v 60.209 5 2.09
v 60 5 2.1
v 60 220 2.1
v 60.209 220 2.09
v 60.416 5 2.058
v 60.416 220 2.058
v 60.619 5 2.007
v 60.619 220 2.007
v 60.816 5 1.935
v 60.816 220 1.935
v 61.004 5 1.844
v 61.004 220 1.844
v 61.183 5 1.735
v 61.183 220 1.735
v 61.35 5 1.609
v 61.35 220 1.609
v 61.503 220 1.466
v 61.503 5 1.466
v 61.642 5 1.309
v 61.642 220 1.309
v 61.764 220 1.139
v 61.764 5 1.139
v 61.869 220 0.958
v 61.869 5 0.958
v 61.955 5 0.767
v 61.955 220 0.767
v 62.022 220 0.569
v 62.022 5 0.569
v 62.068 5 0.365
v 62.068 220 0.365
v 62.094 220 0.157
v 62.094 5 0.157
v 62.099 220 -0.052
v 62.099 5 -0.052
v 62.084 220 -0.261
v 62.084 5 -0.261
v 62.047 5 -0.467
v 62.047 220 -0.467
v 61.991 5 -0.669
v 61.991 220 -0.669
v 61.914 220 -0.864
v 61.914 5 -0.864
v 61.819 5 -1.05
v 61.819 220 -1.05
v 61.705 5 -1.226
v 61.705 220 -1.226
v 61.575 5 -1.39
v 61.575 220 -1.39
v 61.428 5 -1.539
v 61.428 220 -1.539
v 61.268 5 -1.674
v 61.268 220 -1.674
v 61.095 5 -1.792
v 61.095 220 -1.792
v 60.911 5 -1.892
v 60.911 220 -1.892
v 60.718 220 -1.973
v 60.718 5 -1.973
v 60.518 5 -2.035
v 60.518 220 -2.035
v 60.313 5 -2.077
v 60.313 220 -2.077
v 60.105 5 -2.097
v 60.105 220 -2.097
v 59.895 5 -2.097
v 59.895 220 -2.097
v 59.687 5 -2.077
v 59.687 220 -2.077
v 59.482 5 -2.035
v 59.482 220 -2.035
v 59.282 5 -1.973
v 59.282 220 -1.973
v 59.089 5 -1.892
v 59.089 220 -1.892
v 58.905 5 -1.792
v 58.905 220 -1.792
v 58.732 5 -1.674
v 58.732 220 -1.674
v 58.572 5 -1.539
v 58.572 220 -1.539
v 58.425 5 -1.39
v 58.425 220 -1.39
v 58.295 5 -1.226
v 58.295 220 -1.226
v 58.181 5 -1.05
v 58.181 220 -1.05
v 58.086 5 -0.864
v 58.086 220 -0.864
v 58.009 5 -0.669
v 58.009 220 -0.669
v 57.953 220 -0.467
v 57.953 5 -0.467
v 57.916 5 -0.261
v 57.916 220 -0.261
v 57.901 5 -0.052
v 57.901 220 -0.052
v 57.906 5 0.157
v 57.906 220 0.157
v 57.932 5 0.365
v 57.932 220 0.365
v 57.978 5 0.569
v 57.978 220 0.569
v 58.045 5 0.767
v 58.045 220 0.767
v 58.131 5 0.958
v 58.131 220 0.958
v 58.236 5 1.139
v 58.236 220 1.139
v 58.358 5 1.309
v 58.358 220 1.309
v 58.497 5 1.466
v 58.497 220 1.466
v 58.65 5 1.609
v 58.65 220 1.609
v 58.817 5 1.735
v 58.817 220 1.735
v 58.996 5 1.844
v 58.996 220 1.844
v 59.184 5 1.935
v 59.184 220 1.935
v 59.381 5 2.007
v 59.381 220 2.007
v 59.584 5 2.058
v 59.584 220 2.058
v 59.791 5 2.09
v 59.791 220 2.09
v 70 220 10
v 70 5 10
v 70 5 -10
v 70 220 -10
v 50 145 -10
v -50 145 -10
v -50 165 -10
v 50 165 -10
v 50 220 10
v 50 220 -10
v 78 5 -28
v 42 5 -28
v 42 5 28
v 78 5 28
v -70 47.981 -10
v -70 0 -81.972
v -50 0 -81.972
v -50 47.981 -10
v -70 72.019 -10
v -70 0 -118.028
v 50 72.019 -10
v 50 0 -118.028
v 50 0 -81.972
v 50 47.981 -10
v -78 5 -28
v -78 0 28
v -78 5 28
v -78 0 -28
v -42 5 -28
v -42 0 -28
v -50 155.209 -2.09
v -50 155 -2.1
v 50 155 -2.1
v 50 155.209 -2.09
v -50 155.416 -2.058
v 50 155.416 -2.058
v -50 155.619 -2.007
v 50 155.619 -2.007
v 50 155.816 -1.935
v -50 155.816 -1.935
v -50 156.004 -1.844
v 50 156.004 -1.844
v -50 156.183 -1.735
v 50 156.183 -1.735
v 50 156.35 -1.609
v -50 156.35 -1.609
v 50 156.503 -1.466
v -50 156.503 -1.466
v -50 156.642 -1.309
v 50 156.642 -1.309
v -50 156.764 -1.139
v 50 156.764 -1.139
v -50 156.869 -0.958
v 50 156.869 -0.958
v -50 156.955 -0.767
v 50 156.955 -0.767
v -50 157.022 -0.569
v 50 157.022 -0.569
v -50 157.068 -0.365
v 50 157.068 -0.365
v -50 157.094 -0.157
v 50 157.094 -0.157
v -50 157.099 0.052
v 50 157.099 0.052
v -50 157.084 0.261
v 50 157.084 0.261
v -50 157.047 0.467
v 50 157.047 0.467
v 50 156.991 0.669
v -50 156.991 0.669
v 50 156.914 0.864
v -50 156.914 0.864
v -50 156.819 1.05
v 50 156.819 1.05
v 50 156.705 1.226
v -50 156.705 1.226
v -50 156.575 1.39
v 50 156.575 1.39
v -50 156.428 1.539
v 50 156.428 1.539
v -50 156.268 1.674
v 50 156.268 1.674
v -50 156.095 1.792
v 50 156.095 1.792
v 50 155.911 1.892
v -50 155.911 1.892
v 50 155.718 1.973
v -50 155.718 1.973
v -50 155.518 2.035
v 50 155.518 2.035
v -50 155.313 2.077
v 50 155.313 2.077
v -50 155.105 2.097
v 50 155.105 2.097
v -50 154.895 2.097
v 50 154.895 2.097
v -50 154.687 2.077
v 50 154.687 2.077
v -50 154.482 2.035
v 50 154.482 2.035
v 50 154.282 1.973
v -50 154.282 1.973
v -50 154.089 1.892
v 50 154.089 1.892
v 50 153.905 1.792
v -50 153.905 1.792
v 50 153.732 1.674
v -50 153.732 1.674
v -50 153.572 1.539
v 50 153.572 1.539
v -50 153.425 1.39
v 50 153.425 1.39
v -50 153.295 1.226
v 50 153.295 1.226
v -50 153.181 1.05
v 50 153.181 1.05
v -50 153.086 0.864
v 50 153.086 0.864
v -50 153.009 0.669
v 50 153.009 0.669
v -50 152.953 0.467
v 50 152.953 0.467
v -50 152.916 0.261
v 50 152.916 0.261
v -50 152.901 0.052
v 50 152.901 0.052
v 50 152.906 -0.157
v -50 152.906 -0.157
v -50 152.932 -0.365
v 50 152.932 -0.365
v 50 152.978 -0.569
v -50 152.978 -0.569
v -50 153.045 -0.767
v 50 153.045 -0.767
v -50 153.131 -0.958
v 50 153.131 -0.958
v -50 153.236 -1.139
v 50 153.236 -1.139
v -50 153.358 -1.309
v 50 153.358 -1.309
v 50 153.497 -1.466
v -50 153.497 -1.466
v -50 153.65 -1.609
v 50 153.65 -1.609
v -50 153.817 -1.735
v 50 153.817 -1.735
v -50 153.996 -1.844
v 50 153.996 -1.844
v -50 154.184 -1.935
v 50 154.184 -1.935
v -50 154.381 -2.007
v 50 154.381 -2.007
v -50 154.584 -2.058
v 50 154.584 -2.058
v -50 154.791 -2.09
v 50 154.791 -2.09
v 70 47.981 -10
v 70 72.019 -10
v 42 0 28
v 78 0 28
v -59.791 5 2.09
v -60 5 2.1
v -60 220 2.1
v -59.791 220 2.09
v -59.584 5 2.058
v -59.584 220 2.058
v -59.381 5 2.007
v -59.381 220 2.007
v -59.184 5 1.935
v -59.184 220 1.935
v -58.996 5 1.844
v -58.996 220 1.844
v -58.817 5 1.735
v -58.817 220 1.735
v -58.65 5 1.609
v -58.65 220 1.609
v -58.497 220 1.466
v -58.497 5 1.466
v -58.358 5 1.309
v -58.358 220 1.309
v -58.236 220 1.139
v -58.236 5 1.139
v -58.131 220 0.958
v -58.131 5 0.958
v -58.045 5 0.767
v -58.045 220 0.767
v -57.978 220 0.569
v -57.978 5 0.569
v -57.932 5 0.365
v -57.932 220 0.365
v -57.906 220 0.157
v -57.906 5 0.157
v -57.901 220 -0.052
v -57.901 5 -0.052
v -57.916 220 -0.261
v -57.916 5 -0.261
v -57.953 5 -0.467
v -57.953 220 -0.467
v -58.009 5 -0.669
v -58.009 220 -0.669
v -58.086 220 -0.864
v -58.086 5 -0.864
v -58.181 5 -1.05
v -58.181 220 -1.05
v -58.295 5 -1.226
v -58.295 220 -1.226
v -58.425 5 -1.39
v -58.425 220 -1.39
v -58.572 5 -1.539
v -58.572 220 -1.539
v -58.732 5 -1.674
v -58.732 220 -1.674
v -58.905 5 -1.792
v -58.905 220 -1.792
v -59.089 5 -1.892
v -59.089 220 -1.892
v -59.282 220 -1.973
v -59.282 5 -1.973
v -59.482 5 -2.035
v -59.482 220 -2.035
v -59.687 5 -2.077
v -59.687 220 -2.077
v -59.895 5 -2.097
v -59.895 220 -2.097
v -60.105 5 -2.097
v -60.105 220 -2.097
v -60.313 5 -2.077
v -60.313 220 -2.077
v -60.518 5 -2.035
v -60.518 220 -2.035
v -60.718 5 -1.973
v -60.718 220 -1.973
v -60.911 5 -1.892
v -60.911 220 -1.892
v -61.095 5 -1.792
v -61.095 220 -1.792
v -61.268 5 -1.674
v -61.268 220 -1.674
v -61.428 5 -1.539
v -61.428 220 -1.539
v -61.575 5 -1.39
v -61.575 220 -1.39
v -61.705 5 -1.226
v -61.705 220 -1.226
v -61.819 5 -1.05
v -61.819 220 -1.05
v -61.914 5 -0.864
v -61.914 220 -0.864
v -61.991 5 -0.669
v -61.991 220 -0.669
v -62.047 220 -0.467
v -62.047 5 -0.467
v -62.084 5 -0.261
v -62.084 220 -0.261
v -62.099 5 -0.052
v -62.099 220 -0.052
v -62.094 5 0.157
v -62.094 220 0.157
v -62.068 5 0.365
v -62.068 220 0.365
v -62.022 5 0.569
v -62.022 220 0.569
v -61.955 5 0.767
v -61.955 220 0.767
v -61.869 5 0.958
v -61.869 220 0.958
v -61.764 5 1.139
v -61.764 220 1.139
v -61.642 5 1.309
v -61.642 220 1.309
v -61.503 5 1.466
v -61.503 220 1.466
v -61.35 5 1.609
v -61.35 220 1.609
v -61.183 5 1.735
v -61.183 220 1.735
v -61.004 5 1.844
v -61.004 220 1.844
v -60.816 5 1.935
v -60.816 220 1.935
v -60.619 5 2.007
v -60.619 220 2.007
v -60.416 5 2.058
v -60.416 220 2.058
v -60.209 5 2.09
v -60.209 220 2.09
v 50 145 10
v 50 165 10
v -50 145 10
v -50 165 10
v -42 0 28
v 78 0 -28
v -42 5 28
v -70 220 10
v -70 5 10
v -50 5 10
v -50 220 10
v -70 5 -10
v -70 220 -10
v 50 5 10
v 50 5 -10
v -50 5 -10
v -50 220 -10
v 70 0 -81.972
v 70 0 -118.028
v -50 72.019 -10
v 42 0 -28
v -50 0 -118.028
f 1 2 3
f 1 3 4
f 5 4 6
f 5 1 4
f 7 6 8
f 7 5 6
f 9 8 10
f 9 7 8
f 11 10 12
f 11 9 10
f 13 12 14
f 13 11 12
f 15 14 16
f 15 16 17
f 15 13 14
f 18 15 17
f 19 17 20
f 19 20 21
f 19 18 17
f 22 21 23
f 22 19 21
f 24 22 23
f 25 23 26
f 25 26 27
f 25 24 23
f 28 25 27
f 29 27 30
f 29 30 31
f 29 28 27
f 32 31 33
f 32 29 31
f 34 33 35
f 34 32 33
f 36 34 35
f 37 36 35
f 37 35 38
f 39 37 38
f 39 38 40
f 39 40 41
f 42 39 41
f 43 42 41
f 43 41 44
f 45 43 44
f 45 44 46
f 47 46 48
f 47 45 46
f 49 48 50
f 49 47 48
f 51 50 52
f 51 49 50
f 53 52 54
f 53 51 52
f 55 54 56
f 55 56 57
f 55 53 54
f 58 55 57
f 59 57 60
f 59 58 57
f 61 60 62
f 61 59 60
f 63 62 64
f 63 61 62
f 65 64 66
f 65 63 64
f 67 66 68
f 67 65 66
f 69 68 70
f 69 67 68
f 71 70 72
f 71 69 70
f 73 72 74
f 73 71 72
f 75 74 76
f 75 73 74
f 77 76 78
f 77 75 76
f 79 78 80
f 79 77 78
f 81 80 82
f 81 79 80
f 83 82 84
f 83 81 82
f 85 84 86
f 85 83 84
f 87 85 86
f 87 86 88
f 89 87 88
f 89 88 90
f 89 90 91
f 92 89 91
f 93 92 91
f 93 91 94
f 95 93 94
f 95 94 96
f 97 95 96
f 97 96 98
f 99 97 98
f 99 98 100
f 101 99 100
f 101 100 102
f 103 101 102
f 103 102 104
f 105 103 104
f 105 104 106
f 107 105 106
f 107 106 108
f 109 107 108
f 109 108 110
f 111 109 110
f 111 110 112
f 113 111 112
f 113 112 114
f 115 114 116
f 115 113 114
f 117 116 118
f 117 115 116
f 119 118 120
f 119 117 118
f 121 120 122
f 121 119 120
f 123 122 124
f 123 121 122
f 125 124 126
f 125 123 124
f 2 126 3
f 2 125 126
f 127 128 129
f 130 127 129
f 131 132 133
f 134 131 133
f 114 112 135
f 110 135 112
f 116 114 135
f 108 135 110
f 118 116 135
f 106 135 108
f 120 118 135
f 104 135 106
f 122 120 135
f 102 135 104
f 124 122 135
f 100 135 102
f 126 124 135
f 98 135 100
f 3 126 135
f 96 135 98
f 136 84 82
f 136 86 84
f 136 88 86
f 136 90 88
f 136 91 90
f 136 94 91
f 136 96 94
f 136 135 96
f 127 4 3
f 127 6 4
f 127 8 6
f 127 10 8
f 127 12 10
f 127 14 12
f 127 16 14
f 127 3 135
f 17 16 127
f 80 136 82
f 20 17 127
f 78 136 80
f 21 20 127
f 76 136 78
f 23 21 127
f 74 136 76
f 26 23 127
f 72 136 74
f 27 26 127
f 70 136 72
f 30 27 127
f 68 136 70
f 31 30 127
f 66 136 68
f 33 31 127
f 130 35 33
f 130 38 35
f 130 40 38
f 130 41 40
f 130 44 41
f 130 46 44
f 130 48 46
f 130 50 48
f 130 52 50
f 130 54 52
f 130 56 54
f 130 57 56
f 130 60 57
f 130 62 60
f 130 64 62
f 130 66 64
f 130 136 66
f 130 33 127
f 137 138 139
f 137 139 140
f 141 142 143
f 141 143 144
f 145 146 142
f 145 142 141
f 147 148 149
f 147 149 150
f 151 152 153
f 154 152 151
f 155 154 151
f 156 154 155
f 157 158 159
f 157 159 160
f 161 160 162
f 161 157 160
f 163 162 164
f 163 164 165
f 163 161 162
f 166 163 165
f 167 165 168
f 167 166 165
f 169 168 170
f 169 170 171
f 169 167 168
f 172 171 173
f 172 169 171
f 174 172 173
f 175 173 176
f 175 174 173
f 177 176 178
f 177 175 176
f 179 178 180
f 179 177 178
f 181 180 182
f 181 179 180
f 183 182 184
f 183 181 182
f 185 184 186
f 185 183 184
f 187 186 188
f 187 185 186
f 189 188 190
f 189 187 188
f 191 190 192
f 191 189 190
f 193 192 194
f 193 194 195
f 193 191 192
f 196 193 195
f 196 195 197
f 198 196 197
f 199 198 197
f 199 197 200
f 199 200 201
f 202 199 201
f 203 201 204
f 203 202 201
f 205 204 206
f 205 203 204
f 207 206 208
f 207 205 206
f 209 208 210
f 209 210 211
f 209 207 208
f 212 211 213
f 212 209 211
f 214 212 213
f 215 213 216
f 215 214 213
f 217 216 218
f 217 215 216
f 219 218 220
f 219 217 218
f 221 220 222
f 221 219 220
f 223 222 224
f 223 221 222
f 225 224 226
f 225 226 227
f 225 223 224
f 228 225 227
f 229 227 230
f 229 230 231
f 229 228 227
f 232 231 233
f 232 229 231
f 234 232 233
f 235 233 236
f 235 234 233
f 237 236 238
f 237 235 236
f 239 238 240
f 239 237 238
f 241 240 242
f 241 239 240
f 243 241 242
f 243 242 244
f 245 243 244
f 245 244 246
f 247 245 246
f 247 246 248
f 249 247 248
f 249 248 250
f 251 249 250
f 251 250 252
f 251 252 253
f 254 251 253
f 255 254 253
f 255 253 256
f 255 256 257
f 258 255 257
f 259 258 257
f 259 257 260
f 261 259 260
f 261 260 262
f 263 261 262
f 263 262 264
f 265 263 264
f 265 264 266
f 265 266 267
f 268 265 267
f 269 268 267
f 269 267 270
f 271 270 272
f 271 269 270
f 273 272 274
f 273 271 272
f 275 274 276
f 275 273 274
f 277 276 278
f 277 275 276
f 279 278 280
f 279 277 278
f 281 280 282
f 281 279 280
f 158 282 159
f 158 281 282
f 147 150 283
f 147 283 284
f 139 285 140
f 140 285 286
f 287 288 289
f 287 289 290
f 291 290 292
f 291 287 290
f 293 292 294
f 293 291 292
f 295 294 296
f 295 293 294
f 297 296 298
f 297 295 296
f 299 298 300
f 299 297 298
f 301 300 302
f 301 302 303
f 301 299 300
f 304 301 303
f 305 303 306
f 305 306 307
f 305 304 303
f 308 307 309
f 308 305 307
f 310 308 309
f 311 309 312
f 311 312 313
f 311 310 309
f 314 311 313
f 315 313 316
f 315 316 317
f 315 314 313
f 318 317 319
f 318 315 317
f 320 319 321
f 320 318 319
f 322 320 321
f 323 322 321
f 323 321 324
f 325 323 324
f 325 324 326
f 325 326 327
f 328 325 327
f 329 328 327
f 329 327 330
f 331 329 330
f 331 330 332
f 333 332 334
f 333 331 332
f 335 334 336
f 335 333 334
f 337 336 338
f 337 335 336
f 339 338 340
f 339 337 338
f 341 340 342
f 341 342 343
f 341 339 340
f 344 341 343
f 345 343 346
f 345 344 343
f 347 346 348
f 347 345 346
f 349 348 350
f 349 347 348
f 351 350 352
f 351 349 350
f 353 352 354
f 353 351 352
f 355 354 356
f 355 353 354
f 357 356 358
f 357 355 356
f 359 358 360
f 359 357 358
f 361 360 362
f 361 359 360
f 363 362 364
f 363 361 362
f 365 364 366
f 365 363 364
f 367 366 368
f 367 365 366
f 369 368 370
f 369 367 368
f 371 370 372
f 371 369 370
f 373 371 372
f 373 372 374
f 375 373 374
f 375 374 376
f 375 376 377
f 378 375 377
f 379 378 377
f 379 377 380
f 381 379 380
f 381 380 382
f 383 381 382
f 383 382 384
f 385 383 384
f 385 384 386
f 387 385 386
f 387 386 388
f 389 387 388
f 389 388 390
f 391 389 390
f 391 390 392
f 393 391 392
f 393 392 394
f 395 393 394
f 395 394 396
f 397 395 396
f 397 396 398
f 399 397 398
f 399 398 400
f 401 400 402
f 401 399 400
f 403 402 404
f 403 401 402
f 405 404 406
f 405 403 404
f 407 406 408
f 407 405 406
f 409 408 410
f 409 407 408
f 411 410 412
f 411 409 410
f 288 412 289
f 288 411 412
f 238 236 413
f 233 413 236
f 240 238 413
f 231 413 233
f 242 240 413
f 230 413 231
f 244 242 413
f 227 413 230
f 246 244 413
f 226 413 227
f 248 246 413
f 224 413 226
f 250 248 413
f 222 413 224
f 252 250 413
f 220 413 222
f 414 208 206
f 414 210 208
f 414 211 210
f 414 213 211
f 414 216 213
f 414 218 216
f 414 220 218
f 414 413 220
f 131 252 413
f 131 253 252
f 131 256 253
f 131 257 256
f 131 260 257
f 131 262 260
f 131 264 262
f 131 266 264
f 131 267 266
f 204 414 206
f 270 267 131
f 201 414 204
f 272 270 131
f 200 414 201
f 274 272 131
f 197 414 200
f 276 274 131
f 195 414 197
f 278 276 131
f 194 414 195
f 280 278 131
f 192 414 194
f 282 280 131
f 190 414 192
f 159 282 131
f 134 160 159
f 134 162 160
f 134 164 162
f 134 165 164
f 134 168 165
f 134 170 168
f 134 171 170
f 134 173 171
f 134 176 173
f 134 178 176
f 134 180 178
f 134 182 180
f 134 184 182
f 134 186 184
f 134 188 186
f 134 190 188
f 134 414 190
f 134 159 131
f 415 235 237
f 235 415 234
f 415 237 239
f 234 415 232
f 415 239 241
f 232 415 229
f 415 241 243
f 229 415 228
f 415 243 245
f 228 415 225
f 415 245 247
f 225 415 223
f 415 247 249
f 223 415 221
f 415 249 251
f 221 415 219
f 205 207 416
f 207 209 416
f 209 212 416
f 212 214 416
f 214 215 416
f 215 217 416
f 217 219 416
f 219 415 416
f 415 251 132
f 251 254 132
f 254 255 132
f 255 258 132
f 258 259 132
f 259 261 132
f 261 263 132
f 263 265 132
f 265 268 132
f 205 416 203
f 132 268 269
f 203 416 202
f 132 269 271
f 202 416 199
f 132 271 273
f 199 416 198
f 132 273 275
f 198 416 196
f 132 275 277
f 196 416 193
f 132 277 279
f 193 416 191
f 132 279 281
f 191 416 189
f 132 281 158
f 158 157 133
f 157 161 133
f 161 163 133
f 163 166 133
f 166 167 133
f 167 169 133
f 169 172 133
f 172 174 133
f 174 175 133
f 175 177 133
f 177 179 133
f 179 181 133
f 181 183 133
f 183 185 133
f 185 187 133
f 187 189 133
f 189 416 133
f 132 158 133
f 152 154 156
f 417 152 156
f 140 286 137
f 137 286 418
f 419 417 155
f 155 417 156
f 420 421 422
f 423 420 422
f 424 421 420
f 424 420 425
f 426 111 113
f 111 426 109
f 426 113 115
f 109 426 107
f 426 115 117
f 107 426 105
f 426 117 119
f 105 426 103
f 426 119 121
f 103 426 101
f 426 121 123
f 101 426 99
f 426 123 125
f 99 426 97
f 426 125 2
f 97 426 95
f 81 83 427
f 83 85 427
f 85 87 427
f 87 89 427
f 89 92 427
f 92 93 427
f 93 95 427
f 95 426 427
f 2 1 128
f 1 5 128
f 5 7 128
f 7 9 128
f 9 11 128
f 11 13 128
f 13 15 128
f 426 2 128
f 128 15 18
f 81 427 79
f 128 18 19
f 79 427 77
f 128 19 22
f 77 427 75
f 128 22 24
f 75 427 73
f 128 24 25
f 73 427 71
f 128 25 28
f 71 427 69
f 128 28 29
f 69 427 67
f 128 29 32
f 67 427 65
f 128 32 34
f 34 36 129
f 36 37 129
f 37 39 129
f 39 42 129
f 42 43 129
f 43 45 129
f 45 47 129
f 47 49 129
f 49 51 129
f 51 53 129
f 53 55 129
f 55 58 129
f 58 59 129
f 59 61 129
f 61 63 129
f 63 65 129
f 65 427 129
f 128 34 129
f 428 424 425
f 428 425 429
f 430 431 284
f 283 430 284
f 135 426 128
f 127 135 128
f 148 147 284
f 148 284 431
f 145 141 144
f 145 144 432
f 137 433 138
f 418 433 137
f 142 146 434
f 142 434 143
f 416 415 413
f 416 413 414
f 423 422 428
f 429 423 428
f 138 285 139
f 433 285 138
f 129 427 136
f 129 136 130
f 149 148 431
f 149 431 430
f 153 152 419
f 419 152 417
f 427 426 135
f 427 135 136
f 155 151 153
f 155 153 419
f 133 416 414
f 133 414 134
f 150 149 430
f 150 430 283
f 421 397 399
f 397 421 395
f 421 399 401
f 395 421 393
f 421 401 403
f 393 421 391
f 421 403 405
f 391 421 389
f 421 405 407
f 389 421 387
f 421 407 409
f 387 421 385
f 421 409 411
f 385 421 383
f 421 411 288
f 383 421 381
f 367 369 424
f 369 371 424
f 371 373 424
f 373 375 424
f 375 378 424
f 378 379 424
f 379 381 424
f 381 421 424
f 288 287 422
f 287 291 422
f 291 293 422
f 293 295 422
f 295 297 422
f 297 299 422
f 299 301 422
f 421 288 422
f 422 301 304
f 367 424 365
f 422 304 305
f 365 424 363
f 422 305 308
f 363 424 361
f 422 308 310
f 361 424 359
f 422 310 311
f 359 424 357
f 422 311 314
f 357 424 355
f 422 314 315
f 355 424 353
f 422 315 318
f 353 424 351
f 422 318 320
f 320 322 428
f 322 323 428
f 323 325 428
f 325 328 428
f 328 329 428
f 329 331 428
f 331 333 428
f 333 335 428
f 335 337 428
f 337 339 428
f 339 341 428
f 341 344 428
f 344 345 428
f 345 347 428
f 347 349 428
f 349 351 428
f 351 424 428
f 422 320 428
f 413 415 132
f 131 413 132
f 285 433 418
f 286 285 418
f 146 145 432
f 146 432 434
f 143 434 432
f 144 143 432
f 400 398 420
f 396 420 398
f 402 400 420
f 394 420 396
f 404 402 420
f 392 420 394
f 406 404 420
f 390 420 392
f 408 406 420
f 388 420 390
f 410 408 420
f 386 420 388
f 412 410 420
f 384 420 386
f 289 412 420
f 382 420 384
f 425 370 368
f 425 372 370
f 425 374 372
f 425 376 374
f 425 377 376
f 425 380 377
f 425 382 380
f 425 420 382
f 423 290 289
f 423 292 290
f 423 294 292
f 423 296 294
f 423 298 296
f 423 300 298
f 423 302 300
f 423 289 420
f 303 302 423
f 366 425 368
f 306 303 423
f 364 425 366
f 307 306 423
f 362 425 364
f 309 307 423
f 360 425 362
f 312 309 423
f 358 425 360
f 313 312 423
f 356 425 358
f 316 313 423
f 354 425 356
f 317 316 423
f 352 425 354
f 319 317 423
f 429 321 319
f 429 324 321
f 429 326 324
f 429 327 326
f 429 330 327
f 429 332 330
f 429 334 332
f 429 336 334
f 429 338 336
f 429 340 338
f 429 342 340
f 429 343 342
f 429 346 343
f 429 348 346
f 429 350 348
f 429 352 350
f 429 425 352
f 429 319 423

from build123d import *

# Parameters (mm, degrees)
SK_FOOTPLATES_W       = 36
SK_FOOTPLATES_H       = 56
EX_FOOTPLATES_DEPTH   = 5
EX_FOOTPLATES_2_DEPTH = 5
SK_POSTS_W            = 20
SK_POSTS_H            = 20
SK_POSTS_R            = 2.1
EX_POSTS_DEPTH        = 215
EX_POSTS_2_DEPTH      = 215
SK_BRACE_W            = 20
SK_BRACE_H            = 20
SK_BRACE_R            = 2.1
EX_BRACE_DEPTH        = 100
EX_STRUTL_DEPTH       = 20
EX_STRUTR_DEPTH       = 20


with BuildPart() as part:
    # SK_FootPlates → EX_FootPlates (new body)
    with BuildSketch(Plane(origin=(0, 0, 0), x_dir=(1, 0, 0), z_dir=(0, 1, 0))):
        with Locations((60, 0)):
            Rectangle(SK_FOOTPLATES_W, SK_FOOTPLATES_H)
    extrude(amount=EX_FOOTPLATES_DEPTH)


with BuildPart() as body_2:
    # SK_FootPlates → EX_FootPlates 2 (new body)
    with BuildSketch(Plane(origin=(0, 0, 0), x_dir=(1, 0, 0), z_dir=(0, 1, 0))):
        with Locations((-60, 0)):
            Rectangle(SK_FOOTPLATES_W, SK_FOOTPLATES_H)
    extrude(amount=EX_FOOTPLATES_2_DEPTH)


with BuildPart() as body_3:
    # SK_Posts → EX_Posts (new body)
    with BuildSketch(Plane(origin=(0, 5, 0), x_dir=(1, 0, 0), z_dir=(0, 1, 0))):
        with Locations((60, 0)):
            Rectangle(SK_POSTS_W, SK_POSTS_H)
        with Locations((60, 0)):
            Circle(SK_POSTS_R, mode=Mode.SUBTRACT)
    extrude(amount=EX_POSTS_DEPTH)


with BuildPart() as body_4:
    # SK_Posts → EX_Posts 2 (new body)
    with BuildSketch(Plane(origin=(0, 5, 0), x_dir=(1, 0, 0), z_dir=(0, 1, 0))):
        with Locations((-60, 0)):
            Rectangle(SK_POSTS_W, SK_POSTS_H)
        with Locations((-60, 0)):
            Circle(SK_POSTS_R, mode=Mode.SUBTRACT)
    extrude(amount=EX_POSTS_2_DEPTH)


with BuildPart() as body_5:
    # SK_Brace → EX_Brace (new body)
    with BuildSketch(Plane(origin=(-50, 0, 0), x_dir=(0, 0, -1), z_dir=(1, 0, 0))):
        with Locations((0, 155)):
            Rectangle(SK_BRACE_W, SK_BRACE_H)
        with Locations((0, 155)):
            Circle(SK_BRACE_R, mode=Mode.SUBTRACT)
    extrude(amount=EX_BRACE_DEPTH)


with BuildPart() as body_6:
    # SK_StrutL → EX_StrutL (new body)
    with BuildSketch(Plane(origin=(50, 0, 0), x_dir=(0, 0, -1), z_dir=(1, 0, 0))):
        Polygon((118.027756377, 0), (81.972243623, 0), (10, 47.981495748), (10, 72.018504252), align=None)
    extrude(amount=EX_STRUTL_DEPTH)


with BuildPart() as body_7:
    # SK_StrutR → EX_StrutR (new body)
    with BuildSketch(Plane(origin=(-70, 0, 0), x_dir=(0, 0, -1), z_dir=(1, 0, 0))):
        Polygon((118.027756377, 0), (81.972243623, 0), (10, 47.981495748), (10, 72.018504252), align=None)
    extrude(amount=EX_STRUTR_DEPTH)


solid = Compound([part.part, body_2.part, body_3.part, body_4.part, body_5.part, body_6.part, body_7.part])
